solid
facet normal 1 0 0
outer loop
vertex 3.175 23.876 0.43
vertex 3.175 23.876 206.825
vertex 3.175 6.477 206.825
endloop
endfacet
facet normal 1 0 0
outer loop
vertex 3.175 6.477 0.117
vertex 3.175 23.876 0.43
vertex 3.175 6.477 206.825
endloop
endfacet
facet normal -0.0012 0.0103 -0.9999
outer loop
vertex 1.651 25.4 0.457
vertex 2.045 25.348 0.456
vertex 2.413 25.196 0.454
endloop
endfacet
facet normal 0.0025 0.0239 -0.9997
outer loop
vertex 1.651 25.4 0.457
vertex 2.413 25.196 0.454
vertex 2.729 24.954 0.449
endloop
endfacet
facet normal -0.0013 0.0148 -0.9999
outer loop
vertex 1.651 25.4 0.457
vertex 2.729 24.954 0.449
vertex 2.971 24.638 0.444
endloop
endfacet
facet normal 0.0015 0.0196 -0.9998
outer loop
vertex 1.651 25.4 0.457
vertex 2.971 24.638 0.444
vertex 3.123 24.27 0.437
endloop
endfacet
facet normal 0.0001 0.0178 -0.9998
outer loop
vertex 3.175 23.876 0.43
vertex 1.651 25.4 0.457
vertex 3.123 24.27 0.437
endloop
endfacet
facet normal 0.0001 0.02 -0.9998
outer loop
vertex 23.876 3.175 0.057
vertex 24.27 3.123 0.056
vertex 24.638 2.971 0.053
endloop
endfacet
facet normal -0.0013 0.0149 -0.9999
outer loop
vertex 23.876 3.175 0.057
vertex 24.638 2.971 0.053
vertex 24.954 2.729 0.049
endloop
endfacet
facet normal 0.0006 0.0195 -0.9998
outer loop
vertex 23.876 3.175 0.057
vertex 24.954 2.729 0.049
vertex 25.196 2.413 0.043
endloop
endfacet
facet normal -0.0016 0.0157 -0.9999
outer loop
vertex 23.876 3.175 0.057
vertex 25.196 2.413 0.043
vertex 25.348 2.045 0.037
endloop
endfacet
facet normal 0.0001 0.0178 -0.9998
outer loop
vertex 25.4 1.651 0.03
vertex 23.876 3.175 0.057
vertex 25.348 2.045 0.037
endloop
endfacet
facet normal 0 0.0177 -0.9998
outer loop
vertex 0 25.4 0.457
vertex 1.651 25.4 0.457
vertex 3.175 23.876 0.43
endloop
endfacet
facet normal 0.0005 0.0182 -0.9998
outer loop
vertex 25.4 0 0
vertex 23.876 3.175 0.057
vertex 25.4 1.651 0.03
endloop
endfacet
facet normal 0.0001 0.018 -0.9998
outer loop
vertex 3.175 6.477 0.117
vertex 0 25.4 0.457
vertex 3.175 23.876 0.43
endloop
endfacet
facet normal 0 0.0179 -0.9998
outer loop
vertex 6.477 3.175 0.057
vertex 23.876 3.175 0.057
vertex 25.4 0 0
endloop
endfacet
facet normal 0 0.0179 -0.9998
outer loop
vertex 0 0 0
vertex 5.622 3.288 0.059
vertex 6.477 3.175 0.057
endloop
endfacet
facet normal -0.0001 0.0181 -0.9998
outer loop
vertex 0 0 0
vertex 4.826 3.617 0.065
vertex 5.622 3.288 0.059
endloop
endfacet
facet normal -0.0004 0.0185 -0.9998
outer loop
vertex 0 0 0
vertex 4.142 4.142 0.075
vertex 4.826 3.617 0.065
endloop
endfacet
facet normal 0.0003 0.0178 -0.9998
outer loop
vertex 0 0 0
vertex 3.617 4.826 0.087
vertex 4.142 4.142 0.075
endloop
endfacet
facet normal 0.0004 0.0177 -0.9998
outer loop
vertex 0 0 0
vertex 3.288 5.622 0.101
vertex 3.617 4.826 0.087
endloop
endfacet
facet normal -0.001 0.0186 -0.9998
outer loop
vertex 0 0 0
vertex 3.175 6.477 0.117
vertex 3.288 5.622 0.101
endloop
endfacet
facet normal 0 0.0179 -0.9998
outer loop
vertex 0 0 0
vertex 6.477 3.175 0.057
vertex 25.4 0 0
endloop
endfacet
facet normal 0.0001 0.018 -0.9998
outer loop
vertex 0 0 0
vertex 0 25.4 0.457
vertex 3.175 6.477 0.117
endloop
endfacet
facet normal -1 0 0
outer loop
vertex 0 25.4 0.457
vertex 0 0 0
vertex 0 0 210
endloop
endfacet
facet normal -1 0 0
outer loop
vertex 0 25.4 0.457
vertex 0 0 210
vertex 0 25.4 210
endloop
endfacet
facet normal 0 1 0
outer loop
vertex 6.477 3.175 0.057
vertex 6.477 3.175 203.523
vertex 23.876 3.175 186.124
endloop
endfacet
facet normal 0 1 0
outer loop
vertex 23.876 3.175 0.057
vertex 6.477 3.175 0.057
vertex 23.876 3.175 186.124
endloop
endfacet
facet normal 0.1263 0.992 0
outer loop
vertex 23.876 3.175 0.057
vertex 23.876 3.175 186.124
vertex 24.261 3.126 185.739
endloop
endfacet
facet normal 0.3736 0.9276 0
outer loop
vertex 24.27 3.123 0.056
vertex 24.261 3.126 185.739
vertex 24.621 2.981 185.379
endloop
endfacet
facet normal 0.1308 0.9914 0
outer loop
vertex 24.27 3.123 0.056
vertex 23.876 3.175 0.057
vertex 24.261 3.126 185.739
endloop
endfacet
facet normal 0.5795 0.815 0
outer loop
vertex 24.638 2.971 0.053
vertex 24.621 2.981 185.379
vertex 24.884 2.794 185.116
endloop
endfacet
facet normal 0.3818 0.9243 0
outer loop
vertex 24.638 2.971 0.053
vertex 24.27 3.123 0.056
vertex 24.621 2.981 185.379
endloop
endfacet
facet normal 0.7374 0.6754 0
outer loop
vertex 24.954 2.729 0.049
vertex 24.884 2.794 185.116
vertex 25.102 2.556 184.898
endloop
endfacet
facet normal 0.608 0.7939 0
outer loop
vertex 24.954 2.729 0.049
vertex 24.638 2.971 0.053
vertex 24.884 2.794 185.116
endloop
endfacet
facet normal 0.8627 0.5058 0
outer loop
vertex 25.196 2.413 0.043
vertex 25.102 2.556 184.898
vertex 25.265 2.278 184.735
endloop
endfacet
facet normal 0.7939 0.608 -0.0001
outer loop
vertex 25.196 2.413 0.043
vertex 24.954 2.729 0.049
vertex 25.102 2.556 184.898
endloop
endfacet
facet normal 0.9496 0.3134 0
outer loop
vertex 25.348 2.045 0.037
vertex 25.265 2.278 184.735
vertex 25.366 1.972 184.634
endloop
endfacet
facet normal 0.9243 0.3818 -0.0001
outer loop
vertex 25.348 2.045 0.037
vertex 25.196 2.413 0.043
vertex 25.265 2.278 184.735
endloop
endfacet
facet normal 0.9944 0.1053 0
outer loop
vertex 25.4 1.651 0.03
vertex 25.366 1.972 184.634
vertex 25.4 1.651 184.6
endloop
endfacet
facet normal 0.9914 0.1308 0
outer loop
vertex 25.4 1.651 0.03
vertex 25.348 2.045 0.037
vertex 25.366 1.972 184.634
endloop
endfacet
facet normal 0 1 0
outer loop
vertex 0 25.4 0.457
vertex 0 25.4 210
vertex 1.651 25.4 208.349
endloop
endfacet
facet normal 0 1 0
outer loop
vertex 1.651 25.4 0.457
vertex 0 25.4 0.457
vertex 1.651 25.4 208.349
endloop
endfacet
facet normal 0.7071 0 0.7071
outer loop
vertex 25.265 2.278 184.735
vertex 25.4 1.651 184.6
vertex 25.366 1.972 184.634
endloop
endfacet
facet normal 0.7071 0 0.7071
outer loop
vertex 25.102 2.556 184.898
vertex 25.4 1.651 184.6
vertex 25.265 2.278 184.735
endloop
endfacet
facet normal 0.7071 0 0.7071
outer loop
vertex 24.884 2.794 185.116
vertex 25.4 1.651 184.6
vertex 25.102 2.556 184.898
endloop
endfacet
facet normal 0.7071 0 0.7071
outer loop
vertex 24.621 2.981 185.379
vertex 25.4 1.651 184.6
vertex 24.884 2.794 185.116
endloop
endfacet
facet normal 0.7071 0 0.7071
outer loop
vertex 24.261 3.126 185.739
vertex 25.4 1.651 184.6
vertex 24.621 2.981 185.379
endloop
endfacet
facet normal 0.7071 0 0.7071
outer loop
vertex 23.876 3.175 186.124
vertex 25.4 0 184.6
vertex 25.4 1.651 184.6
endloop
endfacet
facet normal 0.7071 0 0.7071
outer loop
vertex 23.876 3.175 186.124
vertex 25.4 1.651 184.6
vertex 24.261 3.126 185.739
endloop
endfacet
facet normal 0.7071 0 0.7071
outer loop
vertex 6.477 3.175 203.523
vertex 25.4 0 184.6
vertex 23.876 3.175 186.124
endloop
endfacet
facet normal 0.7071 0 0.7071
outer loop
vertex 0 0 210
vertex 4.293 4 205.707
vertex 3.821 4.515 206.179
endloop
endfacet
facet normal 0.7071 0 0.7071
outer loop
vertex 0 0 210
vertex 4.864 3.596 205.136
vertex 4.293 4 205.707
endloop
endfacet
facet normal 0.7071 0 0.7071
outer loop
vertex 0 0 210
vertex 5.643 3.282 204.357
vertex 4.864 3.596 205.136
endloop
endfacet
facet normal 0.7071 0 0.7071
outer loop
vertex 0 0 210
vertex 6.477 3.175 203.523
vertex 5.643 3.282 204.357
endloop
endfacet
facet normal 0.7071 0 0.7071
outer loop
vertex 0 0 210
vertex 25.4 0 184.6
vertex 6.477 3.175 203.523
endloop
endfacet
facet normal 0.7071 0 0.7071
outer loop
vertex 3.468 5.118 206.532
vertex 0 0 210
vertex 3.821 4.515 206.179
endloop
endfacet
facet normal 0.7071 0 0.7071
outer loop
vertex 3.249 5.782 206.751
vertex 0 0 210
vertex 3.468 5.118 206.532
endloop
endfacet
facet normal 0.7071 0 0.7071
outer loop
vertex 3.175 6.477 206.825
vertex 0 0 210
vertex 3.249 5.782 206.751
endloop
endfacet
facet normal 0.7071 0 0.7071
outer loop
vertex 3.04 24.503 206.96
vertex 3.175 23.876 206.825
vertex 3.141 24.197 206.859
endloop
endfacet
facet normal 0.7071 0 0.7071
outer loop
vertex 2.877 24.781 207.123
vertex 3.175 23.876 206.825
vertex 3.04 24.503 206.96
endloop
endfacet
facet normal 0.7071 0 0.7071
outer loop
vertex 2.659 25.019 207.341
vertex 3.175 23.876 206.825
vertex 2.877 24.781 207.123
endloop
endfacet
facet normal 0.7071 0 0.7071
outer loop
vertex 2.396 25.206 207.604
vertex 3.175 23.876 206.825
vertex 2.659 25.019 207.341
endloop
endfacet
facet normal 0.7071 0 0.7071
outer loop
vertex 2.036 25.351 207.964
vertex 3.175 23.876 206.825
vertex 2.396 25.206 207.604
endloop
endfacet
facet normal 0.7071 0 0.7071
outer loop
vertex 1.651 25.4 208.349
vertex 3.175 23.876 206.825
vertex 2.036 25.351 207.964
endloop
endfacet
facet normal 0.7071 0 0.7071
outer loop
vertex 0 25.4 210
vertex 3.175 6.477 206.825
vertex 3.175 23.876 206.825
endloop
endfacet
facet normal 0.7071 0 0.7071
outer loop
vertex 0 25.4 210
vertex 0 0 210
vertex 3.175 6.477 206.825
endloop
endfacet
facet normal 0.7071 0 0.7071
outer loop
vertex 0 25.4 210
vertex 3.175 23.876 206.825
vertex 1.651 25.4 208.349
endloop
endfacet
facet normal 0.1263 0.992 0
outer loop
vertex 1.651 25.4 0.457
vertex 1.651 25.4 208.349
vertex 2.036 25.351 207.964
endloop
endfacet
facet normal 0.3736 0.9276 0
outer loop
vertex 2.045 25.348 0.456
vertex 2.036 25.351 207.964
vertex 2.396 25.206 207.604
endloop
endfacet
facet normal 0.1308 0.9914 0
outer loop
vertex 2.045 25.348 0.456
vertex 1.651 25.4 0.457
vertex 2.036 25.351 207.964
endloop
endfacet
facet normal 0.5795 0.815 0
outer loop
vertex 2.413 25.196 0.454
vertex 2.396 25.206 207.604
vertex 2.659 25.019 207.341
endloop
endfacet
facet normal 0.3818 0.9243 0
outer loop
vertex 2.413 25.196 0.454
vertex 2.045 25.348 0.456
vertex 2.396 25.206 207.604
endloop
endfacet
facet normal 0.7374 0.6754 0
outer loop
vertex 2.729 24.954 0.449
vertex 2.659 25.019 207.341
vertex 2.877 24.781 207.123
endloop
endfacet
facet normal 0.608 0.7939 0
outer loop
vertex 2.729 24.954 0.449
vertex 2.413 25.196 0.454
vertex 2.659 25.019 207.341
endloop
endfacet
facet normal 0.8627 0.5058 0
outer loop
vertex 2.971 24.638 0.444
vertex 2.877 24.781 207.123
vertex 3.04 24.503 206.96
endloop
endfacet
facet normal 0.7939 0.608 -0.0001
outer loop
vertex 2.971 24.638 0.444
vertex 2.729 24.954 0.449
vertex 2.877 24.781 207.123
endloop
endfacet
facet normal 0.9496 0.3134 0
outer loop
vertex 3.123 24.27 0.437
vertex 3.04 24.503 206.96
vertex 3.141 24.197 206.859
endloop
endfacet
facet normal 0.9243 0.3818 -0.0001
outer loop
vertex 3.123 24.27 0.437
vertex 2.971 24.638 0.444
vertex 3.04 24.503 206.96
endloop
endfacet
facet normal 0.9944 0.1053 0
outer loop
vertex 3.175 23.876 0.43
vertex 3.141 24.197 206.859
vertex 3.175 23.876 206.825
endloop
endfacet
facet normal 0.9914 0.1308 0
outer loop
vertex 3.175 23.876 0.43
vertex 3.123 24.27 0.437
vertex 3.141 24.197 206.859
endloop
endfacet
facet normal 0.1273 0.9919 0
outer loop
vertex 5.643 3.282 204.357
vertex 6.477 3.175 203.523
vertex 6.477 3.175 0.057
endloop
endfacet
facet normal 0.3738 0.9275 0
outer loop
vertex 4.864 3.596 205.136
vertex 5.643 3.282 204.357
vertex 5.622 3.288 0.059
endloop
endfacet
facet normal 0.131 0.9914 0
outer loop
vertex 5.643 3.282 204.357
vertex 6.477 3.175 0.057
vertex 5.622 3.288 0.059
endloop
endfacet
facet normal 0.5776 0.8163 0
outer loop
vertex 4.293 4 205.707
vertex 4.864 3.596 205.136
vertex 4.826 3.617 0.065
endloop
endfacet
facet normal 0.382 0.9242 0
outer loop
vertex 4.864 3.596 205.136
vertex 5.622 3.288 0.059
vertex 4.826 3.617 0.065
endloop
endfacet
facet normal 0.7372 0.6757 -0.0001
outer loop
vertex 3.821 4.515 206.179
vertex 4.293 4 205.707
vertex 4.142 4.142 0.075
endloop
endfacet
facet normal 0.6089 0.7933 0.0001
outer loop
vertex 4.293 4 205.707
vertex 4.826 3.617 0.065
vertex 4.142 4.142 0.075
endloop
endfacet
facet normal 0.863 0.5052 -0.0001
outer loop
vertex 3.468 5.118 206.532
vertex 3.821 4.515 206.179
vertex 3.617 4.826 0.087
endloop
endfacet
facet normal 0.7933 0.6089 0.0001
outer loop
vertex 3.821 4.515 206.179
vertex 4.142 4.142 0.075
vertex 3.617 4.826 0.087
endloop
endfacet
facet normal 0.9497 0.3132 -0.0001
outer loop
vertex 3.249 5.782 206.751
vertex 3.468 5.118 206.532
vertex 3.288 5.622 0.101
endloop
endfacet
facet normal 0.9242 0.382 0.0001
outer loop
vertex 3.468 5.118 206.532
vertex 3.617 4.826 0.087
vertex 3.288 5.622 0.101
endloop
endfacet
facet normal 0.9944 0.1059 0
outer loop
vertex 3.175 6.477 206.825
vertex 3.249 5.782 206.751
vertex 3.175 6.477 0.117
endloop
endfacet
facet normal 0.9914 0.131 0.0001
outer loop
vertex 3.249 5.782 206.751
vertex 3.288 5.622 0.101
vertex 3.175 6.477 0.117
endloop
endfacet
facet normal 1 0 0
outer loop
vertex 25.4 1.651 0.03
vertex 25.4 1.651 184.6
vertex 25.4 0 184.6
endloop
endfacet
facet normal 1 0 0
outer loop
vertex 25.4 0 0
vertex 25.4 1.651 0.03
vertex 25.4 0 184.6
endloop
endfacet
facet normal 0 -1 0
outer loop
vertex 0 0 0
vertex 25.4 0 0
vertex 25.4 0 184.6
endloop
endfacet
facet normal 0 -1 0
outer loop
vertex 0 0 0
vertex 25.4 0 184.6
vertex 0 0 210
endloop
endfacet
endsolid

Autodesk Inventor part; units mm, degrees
ref_plane "Start Plane" through (0, 0, 0) normal (0, 0, 1) x (1, 0, 0)
ref_plane "End Plane" through (0, 0, 210) normal (0, 0, 1) x (1, 0, 0)
sketch "Sketch" plane through (0, 0, 0) normal (0, 0, 1) x (1, 0, 0)
  line L0 (25.4, 0) -> (0, 0)
  line L1 (0, 0) -> (0, 25.4)
  line L2 (0, 25.4) -> (1.651, 25.4)
  line L3 (3.175, 23.876) -> (3.175, 6.477)
  line L4 (6.477, 3.175) -> (23.876, 3.175)
  line L5 (25.4, 1.651) -> (25.4, 0)
  line L6 (0, -11.0414) -> (0, 31.5385) construction
  line L7 (-11.0414, 0) -> (31.5385, 0) construction
  arc A0 (3.175, 6.477) -> (6.477, 3.175) centre (6.477, 6.477) ccw
  arc A1 (3.175, 23.876) -> (1.651, 25.4) centre (1.651, 23.876) ccw
  arc A2 (25.4, 1.651) -> (23.876, 3.175) centre (23.876, 1.651) ccw
  line L8 (0, 40.0545) -> (0, -19.5574) construction
  line L9 (-19.5574, 0) -> (40.0545, 0) construction
  point P0 (3.175, 25.4)
  point P1 (3.175, 3.175)
  point P2 (25.4, 3.175)
  dimension "d0" = 25.4
  dimension "d1" = 25.4
  dimension "d2" = 3.175
  dimension "d3" = 3.175
  dimension "d10" = 0
  dimension "d11" = 0
  dimension "d14" = 3.302
  dimension "d15" = 1.524
extrude "Body" add sketch "Sketch" along normal up to surface (210 mm away) from surface at 0
sketch "Sketch3" plane through (0, 0, 0) normal (0, 0, 1) x (1, 0, 0)
  line L0 (0, 0) -> (10, 0)
ref_plane "Work Plane3" through (0, 0, 0) normal (0, -1, 0) x (1, 0, 0)
ref_plane "Work Plane4" through (12.7, 0, 0) normal (0, 0.018, -0.9998) x (1, 0, 0)
split "Split1" plane through (12.7, 0, 0) removes the side toward (0, 0.018, -0.9998)
ref_plane "Work Plane8" through (0, 12.7, 210) normal (0.7071, 0, 0.7071) x (0.7071, 0, -0.7071)
split "Split2" plane through (0, 12.7, 210) removes the side toward (0.7071, 0, 0.7071)
sketch "Sketch4" plane through (0, 0, 0) normal (0, -1, 0) x (1, 0, 0)
  line L0 (-2, 0) -> (12, 0) projected
  line L1 (-2, 210) -> (12, 210) projected
  dimension "d17" = 210
equation "\"d0\" = G_H"
equation "\"d1\" = G_H"
equation "\"d2\" = G_T"
equation "\"d3\" = G_T"
equation "\"d14\" = G_IR"
equation "\"d15\" = G_ER"
equation "\"d4\" = G_L"
equation "\"G_H\" = 25.4"
equation "\"G_T\" = 3.175"
equation "\"G_ER\" = 1.524"
equation "\"G_IR\" = 3.302"
equation "\"G_L\" = d17"
equation "\"ex\" = 0"
equation "\"G_OFFSET_START\" = 0"
equation "\"G_OFFSET_END\" = 0"
equation "\"d13\" = G_OFFSET_END + B_L"
equation "\"B_L\" = 210"
properties part number "AISC - L 1 x 1 x 1/8 - 8.268" material "Steel, Mild"
